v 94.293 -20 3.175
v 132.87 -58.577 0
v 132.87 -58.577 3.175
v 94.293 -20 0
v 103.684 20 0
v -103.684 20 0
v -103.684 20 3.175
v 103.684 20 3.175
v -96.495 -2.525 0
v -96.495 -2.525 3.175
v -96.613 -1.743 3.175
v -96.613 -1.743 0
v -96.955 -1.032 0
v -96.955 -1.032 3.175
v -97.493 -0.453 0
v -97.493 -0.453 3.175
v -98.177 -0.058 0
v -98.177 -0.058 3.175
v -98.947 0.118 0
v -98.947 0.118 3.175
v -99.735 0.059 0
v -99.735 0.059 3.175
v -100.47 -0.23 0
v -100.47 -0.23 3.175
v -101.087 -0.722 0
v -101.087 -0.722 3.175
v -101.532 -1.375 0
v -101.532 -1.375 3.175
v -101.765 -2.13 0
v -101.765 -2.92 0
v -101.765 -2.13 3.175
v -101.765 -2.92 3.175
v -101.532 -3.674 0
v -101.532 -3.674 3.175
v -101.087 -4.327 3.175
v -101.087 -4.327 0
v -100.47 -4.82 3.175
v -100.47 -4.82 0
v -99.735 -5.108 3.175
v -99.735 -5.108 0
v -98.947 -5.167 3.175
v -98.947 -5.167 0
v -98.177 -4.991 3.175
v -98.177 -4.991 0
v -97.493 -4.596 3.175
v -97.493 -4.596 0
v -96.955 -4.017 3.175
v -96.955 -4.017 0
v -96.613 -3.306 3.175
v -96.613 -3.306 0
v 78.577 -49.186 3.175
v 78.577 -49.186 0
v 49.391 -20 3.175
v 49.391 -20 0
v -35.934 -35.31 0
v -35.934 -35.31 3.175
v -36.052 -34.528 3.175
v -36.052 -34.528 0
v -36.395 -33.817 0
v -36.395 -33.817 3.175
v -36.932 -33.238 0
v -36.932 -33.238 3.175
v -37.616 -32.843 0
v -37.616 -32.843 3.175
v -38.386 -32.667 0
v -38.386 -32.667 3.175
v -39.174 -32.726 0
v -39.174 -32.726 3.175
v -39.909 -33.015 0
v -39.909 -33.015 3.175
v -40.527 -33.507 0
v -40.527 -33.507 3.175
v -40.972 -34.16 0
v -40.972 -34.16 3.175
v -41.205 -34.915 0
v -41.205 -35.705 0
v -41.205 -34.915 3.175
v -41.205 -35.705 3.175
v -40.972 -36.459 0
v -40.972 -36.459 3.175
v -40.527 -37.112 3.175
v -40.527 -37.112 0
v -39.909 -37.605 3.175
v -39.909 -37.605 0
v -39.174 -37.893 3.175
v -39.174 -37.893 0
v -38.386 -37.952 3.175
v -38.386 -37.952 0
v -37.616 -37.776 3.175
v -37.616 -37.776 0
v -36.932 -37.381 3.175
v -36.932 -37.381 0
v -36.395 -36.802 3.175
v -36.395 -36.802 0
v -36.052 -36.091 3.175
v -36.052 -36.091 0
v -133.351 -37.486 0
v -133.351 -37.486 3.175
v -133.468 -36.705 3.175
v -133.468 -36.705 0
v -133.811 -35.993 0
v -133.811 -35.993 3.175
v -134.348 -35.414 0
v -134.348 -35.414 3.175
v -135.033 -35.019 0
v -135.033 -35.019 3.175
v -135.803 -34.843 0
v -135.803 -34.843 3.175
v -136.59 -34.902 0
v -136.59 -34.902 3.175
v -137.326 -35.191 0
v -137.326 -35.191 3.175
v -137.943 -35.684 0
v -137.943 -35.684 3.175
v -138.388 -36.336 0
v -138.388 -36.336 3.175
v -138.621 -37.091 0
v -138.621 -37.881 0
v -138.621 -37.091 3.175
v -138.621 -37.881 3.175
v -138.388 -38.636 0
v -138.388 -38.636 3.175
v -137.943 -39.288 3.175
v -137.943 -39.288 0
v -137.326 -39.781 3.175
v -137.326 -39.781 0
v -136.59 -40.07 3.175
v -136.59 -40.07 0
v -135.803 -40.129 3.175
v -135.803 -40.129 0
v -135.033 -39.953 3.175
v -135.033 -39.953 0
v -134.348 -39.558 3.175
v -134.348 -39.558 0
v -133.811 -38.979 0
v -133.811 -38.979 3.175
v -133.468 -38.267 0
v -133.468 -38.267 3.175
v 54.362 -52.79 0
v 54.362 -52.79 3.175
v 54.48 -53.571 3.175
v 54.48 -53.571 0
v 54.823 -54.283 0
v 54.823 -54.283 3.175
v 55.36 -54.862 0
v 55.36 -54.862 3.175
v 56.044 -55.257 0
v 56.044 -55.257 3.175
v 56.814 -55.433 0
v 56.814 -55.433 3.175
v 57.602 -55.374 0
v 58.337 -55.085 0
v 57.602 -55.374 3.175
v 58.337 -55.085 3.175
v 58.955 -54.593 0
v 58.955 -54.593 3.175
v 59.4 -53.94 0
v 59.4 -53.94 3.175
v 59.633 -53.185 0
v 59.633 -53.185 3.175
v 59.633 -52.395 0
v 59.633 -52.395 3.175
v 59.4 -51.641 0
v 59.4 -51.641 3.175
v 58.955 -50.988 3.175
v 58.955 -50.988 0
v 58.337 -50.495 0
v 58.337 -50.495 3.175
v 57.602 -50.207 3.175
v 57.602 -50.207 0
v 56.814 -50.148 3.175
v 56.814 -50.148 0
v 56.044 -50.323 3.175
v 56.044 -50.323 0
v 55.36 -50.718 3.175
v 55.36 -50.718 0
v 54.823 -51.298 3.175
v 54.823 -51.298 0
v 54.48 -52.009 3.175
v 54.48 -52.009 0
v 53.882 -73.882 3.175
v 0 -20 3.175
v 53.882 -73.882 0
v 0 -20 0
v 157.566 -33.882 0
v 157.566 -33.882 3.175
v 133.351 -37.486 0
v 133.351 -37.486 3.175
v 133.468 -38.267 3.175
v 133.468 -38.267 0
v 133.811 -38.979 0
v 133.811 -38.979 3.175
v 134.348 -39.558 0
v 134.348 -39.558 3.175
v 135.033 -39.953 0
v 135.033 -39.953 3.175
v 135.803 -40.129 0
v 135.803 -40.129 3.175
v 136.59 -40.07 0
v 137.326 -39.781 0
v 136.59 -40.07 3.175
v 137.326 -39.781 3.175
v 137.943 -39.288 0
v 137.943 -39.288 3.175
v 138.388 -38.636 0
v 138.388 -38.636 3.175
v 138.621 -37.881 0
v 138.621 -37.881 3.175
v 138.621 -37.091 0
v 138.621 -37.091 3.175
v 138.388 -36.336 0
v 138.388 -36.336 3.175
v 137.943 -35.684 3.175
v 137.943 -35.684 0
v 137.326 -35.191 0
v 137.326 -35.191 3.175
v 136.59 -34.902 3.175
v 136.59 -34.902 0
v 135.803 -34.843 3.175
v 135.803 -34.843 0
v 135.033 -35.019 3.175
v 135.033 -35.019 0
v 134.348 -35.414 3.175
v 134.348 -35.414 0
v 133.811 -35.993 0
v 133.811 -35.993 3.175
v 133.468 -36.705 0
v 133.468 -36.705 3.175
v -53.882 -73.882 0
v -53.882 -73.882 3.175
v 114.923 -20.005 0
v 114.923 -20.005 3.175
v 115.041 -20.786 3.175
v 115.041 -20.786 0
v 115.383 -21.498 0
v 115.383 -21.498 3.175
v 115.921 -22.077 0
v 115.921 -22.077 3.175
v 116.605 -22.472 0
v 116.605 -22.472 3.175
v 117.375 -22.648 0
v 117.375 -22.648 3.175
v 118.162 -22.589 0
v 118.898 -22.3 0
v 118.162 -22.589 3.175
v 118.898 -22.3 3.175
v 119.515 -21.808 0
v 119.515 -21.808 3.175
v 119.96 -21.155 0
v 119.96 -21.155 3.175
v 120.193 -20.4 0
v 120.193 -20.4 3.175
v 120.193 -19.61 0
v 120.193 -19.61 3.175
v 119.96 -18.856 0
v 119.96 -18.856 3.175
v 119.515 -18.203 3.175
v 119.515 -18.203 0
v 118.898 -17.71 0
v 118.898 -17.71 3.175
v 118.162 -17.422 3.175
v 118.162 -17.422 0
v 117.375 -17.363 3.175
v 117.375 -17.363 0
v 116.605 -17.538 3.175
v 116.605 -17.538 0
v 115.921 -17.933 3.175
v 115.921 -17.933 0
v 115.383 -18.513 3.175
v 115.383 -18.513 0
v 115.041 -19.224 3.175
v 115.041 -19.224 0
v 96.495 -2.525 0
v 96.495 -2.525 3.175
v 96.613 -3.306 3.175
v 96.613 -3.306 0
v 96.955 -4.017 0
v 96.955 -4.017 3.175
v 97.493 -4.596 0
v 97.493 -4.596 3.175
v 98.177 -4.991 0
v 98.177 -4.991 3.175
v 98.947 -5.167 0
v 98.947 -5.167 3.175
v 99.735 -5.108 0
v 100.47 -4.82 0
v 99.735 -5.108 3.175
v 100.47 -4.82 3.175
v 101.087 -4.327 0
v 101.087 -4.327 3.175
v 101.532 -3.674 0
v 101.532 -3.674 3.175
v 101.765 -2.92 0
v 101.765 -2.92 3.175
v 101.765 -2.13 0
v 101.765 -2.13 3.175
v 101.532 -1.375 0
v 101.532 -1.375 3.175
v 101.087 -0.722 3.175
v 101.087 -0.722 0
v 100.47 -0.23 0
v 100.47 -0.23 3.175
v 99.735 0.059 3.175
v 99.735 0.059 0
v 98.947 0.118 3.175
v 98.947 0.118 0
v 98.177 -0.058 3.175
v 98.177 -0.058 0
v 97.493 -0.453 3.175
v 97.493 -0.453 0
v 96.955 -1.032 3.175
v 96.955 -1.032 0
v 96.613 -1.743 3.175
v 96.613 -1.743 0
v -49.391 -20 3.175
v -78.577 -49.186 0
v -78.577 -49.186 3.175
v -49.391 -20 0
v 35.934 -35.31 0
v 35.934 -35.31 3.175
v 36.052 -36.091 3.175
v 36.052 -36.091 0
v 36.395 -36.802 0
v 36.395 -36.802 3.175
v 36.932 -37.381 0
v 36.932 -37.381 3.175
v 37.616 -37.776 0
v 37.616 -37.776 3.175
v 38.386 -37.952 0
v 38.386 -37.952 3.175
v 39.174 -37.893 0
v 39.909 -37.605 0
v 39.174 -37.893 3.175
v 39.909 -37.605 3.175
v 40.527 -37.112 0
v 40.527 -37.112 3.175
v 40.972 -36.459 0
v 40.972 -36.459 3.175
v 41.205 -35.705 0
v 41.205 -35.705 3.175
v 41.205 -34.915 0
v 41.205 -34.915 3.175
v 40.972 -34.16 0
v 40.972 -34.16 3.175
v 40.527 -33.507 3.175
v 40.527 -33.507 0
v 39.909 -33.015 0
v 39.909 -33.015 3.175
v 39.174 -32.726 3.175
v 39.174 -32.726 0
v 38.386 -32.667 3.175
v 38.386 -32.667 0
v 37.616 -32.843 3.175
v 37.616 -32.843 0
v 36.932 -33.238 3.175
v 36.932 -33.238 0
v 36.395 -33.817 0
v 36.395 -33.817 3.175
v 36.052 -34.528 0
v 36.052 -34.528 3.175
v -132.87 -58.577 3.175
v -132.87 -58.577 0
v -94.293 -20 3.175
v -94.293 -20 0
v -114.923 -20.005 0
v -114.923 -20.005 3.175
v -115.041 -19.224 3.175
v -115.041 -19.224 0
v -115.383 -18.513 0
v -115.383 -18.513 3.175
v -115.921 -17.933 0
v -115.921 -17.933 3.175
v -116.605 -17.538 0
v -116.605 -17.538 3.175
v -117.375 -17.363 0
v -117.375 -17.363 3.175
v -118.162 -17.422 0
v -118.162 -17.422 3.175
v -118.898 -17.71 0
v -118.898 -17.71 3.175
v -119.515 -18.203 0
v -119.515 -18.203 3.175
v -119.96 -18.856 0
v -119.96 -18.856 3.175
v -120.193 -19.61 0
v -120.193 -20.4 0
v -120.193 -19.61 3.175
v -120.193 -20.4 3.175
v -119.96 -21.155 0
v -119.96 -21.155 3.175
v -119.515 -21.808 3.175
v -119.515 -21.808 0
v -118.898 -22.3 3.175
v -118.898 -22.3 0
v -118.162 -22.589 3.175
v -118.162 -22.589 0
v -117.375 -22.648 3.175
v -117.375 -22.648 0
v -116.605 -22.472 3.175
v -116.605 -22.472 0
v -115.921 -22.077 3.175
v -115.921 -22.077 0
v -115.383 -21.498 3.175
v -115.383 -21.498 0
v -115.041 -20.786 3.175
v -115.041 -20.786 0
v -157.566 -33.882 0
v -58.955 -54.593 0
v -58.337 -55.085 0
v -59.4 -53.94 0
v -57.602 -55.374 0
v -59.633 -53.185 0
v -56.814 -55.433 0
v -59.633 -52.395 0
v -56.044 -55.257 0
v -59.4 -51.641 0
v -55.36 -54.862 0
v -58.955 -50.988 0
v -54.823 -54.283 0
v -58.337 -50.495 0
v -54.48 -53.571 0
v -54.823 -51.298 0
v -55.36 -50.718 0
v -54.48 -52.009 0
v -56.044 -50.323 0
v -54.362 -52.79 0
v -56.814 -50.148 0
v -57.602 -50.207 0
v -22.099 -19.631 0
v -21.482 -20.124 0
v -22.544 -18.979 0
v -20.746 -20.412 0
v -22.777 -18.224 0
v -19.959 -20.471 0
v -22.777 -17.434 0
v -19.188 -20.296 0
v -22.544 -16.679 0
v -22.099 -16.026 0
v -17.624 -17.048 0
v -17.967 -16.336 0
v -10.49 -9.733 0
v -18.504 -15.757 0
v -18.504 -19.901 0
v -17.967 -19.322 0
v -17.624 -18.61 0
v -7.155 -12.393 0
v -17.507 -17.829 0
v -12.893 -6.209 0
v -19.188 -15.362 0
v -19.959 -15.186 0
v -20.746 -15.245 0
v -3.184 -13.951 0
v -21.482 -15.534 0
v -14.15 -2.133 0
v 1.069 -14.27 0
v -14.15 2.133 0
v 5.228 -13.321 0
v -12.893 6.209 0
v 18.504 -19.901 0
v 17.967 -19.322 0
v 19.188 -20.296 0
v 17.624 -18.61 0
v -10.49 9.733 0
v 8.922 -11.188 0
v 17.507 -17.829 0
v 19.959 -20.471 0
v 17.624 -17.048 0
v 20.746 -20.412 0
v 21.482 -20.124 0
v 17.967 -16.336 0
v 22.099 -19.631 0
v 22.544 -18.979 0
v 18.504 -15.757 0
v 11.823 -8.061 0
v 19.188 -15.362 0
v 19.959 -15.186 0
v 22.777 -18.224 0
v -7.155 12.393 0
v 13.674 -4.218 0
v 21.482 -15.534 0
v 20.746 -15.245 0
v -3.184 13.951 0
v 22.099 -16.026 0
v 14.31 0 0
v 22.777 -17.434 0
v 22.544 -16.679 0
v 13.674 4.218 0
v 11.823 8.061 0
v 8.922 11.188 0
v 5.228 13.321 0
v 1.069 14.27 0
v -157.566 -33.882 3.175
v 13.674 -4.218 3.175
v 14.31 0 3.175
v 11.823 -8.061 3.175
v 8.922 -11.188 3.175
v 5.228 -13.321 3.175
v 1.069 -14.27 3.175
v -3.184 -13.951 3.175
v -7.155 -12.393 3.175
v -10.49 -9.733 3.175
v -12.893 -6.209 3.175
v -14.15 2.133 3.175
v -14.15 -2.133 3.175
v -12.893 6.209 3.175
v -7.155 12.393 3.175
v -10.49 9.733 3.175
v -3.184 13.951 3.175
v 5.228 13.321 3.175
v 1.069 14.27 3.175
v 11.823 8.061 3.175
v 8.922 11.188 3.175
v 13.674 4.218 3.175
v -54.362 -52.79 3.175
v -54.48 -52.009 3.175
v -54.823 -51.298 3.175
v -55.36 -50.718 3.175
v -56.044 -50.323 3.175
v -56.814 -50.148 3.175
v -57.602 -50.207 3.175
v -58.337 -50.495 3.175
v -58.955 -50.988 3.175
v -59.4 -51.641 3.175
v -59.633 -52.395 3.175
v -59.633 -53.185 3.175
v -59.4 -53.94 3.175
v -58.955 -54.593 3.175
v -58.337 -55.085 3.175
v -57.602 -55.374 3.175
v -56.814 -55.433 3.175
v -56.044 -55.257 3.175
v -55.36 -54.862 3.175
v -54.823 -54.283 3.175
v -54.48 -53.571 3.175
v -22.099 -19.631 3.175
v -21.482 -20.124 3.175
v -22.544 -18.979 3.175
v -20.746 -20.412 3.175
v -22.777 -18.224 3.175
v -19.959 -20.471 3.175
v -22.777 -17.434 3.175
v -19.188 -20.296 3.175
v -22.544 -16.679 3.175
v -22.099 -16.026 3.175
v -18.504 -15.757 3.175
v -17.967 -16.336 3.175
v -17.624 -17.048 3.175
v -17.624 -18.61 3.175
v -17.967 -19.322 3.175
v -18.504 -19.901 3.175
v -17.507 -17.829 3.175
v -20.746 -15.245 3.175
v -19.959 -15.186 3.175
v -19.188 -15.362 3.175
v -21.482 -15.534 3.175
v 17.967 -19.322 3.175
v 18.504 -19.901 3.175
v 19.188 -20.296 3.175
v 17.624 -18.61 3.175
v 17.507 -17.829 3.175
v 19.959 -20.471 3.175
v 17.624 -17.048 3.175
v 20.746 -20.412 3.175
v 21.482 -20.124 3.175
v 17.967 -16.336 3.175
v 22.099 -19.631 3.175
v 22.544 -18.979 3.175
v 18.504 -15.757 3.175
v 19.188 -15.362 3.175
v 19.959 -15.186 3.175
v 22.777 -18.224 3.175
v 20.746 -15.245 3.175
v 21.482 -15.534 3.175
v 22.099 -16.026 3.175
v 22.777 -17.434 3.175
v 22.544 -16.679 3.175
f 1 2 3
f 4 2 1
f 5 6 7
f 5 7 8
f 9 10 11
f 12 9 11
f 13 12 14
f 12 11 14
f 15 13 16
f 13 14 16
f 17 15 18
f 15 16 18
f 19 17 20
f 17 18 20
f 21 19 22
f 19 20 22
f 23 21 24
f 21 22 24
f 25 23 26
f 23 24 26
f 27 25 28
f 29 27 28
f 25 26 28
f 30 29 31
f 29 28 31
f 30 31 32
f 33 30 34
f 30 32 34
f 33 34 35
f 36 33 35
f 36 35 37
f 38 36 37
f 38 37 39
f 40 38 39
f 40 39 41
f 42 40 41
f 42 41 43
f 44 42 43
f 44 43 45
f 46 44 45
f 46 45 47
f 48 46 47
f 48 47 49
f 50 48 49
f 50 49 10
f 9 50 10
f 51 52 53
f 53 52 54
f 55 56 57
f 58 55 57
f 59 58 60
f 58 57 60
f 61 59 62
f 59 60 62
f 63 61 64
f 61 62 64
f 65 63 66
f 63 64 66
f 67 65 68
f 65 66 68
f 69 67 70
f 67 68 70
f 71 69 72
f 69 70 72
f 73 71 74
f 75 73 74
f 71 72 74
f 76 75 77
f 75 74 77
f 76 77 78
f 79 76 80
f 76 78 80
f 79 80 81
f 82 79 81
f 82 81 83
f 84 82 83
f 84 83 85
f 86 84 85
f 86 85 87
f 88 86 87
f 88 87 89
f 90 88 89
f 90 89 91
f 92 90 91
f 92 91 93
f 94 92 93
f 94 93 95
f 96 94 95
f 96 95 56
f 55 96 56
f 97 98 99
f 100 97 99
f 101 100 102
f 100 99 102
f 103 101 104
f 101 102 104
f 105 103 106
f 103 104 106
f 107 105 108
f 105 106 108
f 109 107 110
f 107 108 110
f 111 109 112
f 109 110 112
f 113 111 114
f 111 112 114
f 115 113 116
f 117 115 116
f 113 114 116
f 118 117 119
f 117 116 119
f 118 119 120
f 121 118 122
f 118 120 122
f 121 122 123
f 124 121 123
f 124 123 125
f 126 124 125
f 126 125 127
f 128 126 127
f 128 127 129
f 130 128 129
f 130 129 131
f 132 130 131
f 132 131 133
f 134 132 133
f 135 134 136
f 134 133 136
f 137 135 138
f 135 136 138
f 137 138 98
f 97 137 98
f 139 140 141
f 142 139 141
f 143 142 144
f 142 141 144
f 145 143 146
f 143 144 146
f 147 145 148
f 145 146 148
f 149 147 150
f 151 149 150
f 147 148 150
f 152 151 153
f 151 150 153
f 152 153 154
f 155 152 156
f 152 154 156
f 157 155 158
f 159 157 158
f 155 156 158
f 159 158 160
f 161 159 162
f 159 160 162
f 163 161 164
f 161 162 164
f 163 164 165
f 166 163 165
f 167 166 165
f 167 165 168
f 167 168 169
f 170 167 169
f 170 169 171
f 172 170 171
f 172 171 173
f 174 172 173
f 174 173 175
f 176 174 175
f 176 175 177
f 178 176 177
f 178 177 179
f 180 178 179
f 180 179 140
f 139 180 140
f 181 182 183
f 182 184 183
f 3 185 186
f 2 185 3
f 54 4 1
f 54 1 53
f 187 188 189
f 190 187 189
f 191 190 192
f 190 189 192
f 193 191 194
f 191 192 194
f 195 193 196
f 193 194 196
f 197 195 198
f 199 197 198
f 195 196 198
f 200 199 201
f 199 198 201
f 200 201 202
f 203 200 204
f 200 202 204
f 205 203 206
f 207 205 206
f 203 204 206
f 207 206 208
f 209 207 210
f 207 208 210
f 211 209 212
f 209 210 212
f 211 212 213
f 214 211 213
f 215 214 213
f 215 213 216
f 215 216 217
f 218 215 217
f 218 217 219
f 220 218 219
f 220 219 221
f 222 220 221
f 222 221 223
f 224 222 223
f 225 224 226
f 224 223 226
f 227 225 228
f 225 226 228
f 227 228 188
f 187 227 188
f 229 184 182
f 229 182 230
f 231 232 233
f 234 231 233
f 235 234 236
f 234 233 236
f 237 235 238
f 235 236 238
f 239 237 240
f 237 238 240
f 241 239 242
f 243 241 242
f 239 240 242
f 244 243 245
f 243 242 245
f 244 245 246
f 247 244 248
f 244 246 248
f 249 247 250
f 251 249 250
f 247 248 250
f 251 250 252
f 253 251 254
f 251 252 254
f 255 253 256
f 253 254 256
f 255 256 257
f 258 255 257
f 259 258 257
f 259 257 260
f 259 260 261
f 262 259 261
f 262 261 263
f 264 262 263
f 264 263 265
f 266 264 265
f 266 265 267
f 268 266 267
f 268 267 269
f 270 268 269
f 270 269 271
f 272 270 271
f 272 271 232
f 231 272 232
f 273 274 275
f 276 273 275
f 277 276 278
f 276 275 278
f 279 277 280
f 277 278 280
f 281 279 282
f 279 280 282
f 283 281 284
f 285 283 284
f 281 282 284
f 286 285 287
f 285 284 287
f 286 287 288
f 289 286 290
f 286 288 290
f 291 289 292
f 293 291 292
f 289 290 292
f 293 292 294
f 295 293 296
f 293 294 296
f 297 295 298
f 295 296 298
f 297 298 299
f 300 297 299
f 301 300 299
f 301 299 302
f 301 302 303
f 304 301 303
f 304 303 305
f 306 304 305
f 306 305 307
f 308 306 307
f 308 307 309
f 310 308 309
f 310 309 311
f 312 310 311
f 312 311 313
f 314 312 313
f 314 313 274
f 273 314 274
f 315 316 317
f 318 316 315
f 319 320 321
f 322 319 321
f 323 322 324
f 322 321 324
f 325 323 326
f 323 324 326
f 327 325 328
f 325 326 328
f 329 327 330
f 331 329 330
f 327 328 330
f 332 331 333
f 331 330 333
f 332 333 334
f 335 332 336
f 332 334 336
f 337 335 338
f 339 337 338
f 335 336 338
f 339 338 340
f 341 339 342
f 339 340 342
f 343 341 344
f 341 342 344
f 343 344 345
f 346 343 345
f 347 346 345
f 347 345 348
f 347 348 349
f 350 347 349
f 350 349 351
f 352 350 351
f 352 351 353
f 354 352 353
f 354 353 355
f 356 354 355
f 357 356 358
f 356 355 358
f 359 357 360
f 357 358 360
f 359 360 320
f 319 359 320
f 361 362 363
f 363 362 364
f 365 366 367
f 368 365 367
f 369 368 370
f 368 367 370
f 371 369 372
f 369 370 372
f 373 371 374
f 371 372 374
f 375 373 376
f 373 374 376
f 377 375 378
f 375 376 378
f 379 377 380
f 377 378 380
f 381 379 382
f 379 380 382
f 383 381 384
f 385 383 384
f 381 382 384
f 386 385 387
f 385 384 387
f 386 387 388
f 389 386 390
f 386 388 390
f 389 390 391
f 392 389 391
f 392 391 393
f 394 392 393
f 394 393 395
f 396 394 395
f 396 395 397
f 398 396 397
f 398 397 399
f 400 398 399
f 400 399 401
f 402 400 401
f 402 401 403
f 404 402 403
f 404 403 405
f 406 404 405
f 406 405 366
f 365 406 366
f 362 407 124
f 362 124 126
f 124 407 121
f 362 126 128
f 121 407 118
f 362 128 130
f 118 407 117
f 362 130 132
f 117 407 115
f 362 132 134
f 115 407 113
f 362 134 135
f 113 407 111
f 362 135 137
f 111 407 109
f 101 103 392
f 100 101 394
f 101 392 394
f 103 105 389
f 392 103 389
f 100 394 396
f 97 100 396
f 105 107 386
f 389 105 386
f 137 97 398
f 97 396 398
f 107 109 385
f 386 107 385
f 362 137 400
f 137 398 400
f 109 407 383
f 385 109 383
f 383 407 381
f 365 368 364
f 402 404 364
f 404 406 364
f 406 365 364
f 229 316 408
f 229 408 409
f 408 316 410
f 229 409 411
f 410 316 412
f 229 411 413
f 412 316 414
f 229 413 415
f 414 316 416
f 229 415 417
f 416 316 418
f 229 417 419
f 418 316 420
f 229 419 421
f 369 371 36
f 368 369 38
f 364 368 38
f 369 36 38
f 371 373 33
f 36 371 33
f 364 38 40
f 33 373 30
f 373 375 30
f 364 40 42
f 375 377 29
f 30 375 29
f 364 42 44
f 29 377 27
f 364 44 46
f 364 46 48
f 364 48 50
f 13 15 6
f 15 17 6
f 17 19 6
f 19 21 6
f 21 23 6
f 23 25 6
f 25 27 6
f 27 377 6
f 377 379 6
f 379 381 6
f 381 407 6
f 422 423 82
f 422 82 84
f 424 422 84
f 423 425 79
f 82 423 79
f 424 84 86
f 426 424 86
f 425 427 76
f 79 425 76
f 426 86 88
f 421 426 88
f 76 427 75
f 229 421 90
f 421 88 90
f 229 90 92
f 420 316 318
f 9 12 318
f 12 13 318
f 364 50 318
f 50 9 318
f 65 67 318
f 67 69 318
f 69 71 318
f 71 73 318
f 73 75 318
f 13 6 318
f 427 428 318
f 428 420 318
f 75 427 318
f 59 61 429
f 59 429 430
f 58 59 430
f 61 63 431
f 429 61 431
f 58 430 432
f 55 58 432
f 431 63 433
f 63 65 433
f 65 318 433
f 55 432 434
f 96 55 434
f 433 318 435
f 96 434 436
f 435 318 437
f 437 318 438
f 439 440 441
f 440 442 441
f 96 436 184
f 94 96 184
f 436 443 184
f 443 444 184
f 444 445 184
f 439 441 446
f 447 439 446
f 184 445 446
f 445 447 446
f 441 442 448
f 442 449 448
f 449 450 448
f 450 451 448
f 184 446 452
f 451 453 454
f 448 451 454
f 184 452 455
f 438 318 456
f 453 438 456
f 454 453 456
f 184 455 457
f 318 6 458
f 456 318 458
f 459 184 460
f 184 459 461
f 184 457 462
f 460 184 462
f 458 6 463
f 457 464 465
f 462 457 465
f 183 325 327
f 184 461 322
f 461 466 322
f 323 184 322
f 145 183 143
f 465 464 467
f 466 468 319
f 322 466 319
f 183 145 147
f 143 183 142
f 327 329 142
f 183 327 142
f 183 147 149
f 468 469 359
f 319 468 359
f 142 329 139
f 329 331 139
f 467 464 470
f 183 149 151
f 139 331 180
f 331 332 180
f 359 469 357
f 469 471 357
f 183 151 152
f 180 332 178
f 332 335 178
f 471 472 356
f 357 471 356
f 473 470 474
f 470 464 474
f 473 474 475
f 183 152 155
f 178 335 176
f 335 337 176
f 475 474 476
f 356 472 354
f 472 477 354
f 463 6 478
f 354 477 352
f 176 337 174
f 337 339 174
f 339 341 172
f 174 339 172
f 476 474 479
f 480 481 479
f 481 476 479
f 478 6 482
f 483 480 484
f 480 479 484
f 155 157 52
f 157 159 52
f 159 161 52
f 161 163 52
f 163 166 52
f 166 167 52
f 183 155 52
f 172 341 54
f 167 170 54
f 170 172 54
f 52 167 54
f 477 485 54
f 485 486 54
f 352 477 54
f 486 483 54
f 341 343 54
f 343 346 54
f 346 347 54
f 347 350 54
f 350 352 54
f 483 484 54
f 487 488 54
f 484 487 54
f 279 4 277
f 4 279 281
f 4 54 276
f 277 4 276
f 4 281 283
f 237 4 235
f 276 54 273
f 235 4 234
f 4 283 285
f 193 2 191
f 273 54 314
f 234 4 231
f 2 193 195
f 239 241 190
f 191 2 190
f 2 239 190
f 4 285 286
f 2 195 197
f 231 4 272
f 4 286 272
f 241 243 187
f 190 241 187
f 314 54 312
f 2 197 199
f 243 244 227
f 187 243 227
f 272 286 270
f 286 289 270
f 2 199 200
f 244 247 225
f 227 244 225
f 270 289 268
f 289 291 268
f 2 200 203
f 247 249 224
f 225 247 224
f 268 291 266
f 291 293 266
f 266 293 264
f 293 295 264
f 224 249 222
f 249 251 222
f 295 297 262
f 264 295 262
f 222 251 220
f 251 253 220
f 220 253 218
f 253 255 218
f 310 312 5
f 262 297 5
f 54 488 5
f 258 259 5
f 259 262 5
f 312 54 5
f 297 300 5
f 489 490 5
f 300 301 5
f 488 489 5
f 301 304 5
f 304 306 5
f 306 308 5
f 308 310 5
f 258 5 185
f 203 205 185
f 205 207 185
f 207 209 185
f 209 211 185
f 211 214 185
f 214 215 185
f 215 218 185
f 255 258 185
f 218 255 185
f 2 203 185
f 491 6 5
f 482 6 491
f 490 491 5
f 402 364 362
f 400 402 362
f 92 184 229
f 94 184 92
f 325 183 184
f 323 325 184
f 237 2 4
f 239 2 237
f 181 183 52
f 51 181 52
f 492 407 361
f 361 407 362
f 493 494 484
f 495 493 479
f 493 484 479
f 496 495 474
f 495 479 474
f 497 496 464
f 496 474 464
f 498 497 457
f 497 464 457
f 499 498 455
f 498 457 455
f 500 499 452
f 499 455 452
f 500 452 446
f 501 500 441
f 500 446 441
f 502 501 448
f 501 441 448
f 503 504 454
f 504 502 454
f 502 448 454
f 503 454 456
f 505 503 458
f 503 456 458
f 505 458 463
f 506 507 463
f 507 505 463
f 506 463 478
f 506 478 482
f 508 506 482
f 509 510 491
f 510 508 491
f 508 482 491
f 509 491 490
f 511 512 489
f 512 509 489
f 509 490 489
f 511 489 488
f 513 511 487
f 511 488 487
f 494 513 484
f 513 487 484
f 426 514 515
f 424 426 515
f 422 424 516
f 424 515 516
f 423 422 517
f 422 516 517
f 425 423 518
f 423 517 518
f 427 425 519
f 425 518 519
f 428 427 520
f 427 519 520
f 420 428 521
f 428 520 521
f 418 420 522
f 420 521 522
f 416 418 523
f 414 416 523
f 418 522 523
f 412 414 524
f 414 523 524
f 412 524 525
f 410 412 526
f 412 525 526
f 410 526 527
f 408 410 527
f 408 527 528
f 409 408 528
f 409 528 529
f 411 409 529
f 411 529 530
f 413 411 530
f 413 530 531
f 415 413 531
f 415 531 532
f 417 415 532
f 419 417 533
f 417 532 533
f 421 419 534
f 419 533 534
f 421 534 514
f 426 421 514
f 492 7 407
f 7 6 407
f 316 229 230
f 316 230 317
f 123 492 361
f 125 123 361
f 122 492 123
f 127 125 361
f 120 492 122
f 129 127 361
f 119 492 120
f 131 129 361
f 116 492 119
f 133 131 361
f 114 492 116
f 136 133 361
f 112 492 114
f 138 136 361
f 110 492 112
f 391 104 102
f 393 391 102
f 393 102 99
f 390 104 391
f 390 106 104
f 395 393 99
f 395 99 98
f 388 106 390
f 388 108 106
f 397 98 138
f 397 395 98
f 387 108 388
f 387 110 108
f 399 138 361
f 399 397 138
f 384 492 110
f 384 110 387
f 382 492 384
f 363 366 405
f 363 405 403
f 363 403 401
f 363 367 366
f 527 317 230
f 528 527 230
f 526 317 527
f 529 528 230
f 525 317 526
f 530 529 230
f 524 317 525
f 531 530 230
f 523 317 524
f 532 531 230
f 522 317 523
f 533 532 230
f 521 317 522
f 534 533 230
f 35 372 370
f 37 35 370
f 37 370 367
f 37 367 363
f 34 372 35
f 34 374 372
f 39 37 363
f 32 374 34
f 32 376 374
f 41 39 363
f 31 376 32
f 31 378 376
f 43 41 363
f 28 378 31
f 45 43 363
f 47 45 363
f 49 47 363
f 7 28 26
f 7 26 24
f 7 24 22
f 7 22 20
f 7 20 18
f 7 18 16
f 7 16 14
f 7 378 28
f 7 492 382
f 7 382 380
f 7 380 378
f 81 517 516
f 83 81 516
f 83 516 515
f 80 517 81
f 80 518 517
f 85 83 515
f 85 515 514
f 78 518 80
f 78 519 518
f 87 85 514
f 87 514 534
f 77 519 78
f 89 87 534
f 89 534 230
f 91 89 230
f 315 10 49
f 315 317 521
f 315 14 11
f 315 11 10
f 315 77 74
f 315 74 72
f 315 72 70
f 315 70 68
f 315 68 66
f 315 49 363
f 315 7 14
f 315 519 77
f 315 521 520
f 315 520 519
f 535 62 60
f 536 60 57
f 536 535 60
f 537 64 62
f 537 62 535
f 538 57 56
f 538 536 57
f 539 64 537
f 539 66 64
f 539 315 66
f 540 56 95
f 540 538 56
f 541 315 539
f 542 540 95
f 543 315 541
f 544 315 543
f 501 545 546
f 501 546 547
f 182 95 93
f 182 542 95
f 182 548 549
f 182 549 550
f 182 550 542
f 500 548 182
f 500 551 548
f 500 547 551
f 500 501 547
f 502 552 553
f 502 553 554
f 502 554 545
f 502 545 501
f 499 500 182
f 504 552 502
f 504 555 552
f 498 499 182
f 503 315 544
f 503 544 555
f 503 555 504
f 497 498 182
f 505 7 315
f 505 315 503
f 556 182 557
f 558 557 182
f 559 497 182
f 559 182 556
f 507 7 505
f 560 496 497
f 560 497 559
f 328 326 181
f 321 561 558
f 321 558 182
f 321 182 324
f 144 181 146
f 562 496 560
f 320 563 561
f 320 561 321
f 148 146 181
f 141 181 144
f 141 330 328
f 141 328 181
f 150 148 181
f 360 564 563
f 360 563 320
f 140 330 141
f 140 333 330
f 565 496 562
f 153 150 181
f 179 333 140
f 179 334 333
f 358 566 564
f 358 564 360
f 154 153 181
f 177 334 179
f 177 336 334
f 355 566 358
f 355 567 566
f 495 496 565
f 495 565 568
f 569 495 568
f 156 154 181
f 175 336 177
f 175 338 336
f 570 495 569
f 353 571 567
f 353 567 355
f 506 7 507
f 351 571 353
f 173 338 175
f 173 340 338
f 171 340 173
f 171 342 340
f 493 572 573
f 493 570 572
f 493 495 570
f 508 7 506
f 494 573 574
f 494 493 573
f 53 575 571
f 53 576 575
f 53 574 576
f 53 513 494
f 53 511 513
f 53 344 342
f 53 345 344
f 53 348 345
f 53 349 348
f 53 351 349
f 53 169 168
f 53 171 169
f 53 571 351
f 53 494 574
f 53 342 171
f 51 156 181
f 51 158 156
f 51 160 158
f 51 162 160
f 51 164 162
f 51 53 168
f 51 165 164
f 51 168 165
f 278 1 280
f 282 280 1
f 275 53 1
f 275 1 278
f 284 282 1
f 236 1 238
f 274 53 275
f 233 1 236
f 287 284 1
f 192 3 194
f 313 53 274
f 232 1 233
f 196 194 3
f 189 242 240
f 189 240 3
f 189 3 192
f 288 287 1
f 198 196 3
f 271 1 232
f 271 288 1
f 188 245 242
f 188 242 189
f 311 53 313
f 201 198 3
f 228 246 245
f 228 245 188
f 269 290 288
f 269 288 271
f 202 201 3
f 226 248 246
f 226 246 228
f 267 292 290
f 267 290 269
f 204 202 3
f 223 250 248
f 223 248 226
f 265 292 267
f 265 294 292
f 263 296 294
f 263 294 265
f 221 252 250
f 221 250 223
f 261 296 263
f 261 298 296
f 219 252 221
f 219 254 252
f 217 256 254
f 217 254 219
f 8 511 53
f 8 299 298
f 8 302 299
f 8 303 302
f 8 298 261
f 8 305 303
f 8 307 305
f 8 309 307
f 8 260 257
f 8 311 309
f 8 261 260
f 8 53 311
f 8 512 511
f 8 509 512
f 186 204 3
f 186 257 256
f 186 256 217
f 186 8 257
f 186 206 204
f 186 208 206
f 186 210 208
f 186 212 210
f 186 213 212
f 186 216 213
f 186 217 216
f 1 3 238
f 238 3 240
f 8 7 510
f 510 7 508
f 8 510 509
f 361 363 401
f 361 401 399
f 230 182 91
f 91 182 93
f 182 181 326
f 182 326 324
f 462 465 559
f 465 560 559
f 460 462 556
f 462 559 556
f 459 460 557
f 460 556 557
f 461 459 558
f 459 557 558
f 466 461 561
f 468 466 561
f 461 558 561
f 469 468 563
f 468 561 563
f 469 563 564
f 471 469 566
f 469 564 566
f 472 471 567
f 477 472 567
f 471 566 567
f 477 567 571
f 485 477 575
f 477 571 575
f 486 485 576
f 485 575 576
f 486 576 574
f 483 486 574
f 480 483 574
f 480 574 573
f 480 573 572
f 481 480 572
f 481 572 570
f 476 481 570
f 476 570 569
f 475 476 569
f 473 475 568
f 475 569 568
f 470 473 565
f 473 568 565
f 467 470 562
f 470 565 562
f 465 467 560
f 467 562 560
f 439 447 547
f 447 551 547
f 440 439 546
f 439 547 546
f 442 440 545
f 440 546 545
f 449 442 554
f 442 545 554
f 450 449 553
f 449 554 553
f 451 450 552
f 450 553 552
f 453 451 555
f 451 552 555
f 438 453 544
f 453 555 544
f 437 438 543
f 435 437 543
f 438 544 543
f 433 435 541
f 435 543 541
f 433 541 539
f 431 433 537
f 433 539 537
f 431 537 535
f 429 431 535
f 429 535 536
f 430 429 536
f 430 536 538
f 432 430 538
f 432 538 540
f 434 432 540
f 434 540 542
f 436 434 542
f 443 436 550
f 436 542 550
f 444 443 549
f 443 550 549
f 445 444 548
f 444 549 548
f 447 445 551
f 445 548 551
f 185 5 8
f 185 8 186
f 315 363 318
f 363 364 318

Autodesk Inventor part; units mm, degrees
ref_plane "YZ Plane" through (0, 0, 0) normal (1, 0, 0) x (0, 1, 0)
ref_plane "XZ Plane" through (0, 0, 0) normal (0, 1, 0) x (-1, 0, 0)
ref_plane "XY Plane" through (0, 0, 0) normal (0, 0, 1) x (1, 0, 0)
sketch "Sketch1" plane through (0, 0, 0) normal (0, 0, 1) x (1, 0, 0)
  circle A0 centre (0, 0) radius 14.31
  line L0 (-78.5772, -49.1858) -> (-49.3914, -20)
  line L1 (0, -92.6578) -> (0, 38.7763) projected
  line L2 (0, -20) -> (-53.8815, -73.8815)
  line L3 (-53.8815, -73.8815) -> (-78.5772, -49.1858)
  line L4 (0, 20) -> (-103.6841, 20)
  line L5 (-103.6841, 20) -> (-157.5656, -33.8815)
  line L6 (-157.5656, -33.8815) -> (-132.8699, -58.5772)
  line L7 (-132.8699, -58.5772) -> (-94.2927, -20)
  line L8 (-94.2927, -20) -> (-49.3914, -20)
  line L9 (78.5772, -49.1858) -> (49.3914, -20)
  line L10 (0, -20) -> (53.8815, -73.8815)
  line L11 (53.8815, -73.8815) -> (78.5772, -49.1858)
  line L12 (0, 20) -> (103.6841, 20)
  line L13 (103.6841, 20) -> (157.5656, -33.8815)
  line L14 (157.5656, -33.8815) -> (132.8699, -58.5772)
  line L15 (132.8699, -58.5772) -> (94.2927, -20)
  line L16 (94.2927, -20) -> (49.3914, -20)
  line L17 (0, -20) -> (-10.1971, -30.1971)
  point P0 (-68.6659, -39.2745)
  dimension "d1" = 28.62
  dimension "d4" = 76.2
  dimension "d6" = 45
  dimension "d15" = 34.925
  dimension "d59" = 34.925
  dimension "d61" = 101.6
  dimension "d62" = 40
  dimension "d63" = 20
extrude "Extrusion1" add sketch "Sketch1" along normal blind 3.175 contours A0 L1 L12 L13 L14 L15 L16 L9 L11 L10 | A0 L1 L2 L3 L0 L8 L7 L6 L5 L4
sketch "Sketch3" plane through (0, 0, 3.175) normal (0, 0, 1) x (1, 0, 0)
  line L0 (53.8815, -73.8815) -> (78.5772, -49.1858) projected
  line L1 (78.5772, -49.1858) -> (49.3914, -20) projected
  line L2 (49.3914, -20) -> (94.2927, -20) projected
  line L3 (94.2927, -20) -> (132.8699, -58.5772) projected
  line L4 (132.8699, -58.5772) -> (157.5656, -33.8815) projected
  line L5 (157.5656, -33.8815) -> (103.6841, 20) projected
  line L6 (103.6841, 20) -> (-103.6841, 20) projected
  line L7 (-103.6841, 20) -> (-157.5656, -33.8815) projected
  line L8 (-157.5656, -33.8815) -> (-132.8699, -58.5772) projected
  line L9 (-132.8699, -58.5772) -> (-94.2927, -20) projected
  line L10 (-94.2927, -20) -> (-49.3914, -20) projected
  line L11 (-49.3914, -20) -> (-78.5772, -49.1858) projected
  line L12 (-78.5772, -49.1858) -> (-53.8815, -73.8815) projected
  line L13 (-53.8815, -73.8815) -> (0, -20) projected
  line L14 (0, -20) -> (53.8815, -73.8815) projected
  circle A0 centre (0, 0) radius 14.31 projected
  line L15 (-145.2178, -46.2294) -> (-75.3998, 20)
  line L16 (-66.2294, -61.5337) -> (19.7221, 20)
  circle A1 centre (-136.0007, -37.486) radius 2.65
  circle A2 centre (-117.5728, -20.0053) radius 2.65
  circle A3 centre (-99.1449, -2.5246) radius 2.65
  circle A4 centre (-57.0123, -52.7903) radius 2.65
  circle A5 centre (-38.5844, -35.3096) radius 2.65
  circle A6 centre (-20.1566, -17.8289) radius 2.65
  dimension "d64" = 5.3
  dimension "d67" = 25.4
  dimension "d72" = 12.7
  dimension "d73" = 12.7
  dimension "d76" = 25.4
extrude "Extrusion3" cut sketch "Sketch3" against normal blind 25.4 contours A4 L16 | L16 A4 | A5 L16 | L16 A5 | A6 L16 | L16 A6 | A3 L15 | L15 A3 | A1 L15 | L15 A1 | A2 L15 | L15 A2
mirror "Mirror2" about plane through (0, 0, 0) normal (1, 0, 0) of "Extrusion3"
equation "\"d1\" = bearingDiameter"
equation "\"d4\" = boltedLength"
equation "\"d6\" = 0.5 * theta12"
equation "\"d59\" = d15"
equation "\"d61\" = gearboxLength"
equation "\"d62\" = plateHeight"
equation "\"d63\" = 0.5 * plateHeight"
equation "\"topDiameter\" = 45"
equation "\"bearingDiameter\" = 28.62"
equation "\"plateThickness\" = 6.35"
equation "\"theta12\" = 90deg"
equation "\"gearboxLength\" = 101.6"
equation "\"boltedLength\" = 76.2"
equation "\"topDiameter_1\" = 25"
equation "\"shaftLength_1\" = 76.2"
equation "\"bearingDiameter_1\" = 28.62"
equation "\"plateThickness_1\" = 6.35"
equation "\"theta12_1\" = 100deg"
equation "\"boltDiameter_1\" = 6"
equation "\"gearboxLength_1\" = 101.6"
equation "\"boltedLength_1\" = 76.2"
equation "\"innerBoltSpacing_1\" = 12.7"
equation "\"outerBoltSpacing_1\" = 12.7"
equation "\"shaftLength\" = 76.2"
equation "\"boltDiameter\" = 5.3"
equation "\"outerBoltSpacing\" = 12.7"
equation "\"innerBoltSpacing\" = 12.7"
equation "\"plateHeight\" = 40"
properties part number "CH1-01-KneePivotPlate" material "Aluminum 6061"
